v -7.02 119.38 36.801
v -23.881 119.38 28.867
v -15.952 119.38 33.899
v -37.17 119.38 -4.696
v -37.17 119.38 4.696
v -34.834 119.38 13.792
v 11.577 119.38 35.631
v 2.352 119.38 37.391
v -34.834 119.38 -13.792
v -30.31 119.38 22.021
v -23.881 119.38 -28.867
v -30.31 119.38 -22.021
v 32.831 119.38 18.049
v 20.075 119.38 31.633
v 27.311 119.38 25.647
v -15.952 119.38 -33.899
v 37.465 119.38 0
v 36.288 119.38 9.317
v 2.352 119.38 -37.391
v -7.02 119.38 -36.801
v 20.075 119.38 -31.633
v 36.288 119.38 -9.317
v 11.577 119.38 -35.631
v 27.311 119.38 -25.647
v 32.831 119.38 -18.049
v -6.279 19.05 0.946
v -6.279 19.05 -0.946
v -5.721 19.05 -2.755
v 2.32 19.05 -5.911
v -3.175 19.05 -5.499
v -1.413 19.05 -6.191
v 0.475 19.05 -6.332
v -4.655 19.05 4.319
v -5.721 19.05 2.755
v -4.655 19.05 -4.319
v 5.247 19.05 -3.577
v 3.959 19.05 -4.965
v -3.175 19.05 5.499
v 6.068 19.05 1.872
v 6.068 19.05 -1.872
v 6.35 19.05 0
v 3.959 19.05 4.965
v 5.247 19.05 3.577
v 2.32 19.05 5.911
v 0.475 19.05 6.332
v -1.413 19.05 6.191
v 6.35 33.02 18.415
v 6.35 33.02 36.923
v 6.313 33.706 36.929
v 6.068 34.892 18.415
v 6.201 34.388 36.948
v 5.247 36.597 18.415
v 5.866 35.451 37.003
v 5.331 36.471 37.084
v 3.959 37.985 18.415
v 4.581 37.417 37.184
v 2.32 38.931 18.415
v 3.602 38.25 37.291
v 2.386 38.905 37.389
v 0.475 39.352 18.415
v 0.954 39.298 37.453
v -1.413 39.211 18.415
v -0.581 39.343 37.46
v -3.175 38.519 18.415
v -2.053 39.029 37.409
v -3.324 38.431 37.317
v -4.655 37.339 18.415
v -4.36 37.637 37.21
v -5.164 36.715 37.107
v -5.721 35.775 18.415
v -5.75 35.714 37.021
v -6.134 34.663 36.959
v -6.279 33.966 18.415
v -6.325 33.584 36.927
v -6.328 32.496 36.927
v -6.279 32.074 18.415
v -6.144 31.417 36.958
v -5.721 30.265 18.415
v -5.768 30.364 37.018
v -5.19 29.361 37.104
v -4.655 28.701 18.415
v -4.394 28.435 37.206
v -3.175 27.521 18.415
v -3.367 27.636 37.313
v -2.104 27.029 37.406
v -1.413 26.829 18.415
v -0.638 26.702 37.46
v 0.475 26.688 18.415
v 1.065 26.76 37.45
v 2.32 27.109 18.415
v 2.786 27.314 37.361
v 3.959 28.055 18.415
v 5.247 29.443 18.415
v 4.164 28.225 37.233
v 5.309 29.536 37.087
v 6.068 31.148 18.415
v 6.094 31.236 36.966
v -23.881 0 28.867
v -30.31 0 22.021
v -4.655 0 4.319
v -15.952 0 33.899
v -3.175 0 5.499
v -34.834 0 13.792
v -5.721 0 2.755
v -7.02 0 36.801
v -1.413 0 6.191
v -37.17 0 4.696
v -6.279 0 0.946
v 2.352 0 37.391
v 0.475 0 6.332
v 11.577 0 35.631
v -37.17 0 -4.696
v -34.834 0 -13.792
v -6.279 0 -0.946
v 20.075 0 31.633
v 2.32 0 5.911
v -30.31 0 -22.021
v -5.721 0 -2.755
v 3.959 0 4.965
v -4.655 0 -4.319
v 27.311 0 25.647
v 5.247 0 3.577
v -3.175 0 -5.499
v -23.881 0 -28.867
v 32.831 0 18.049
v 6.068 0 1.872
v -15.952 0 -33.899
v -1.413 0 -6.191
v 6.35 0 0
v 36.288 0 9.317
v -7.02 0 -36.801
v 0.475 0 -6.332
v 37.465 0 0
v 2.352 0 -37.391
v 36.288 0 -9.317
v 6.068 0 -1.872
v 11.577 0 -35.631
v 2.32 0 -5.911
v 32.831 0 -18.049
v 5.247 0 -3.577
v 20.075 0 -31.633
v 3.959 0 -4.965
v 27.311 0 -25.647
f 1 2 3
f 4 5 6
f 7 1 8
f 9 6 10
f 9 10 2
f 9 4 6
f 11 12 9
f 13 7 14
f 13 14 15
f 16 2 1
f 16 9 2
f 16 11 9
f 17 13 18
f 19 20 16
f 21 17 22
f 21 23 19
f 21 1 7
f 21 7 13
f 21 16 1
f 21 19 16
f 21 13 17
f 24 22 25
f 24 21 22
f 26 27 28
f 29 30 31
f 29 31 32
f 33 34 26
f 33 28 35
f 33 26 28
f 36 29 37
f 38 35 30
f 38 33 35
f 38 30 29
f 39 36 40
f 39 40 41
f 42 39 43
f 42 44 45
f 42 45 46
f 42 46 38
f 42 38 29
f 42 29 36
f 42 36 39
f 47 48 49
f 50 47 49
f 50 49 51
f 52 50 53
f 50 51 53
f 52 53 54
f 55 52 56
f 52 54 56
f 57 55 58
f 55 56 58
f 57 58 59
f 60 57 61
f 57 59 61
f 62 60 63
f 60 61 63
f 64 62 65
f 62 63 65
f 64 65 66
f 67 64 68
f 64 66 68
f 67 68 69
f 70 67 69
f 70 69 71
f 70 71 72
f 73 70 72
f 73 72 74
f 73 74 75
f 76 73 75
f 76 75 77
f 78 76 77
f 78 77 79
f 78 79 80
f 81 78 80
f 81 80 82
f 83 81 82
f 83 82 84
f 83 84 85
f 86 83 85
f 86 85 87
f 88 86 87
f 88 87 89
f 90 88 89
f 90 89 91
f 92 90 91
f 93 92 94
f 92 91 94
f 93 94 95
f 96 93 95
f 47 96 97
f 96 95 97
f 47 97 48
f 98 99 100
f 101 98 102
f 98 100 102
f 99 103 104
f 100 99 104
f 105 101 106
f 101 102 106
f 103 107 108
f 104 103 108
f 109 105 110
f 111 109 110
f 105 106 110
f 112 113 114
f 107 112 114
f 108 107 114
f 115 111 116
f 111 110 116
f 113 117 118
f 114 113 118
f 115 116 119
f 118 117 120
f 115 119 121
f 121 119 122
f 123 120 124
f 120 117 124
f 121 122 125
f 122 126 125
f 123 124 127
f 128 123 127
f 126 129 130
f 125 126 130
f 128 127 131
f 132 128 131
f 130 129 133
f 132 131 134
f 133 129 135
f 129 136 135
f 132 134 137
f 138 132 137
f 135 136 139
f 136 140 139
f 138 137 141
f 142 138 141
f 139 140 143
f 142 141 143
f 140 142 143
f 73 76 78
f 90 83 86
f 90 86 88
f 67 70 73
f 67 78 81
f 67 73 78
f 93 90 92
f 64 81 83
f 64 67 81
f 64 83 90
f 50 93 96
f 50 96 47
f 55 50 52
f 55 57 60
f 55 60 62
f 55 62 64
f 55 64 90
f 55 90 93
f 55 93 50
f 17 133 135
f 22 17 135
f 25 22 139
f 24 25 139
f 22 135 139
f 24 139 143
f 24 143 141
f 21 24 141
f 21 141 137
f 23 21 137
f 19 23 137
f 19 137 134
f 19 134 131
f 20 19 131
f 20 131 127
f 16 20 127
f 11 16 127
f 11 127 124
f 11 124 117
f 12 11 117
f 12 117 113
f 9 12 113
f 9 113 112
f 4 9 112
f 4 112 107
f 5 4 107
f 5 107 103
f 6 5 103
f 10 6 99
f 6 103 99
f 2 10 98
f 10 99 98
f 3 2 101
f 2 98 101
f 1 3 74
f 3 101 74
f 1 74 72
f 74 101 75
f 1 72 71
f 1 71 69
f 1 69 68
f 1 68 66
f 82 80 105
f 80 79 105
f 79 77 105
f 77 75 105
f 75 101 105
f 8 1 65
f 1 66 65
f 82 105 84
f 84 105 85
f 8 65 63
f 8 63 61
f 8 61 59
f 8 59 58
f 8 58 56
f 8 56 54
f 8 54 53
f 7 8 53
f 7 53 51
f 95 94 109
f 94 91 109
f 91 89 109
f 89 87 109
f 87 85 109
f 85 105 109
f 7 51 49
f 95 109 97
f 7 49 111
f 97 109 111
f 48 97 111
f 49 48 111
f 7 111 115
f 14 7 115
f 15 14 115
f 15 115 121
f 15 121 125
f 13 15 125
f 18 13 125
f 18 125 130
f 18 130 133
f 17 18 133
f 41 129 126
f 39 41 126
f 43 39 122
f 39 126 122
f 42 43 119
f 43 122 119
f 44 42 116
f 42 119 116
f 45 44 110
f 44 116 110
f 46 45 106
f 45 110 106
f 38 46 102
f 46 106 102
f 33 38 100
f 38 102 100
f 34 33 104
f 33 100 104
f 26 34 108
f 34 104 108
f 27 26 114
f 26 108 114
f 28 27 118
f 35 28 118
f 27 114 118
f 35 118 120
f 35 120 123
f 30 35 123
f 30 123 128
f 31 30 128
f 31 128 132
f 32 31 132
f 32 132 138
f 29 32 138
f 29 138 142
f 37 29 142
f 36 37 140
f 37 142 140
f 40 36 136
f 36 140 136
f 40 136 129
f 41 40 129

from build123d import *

# Parameters (mm, degrees)
SKETCH1_R           = 37.465
BOSS_EXTRUDE1_DEPTH = 119.38
SKETCH3_R           = 6.35
CUT_EXTRUDE1_DEPTH  = 19.05
SKETCH4_R           = 6.35
CUT_EXTRUDE2_DEPTH  = 19.05


with BuildPart() as part:
    # Sketch1 → Boss-Extrude1 (new body)
    with BuildSketch(Plane(origin=(0, 0, 0), x_dir=(1, 0, 0), z_dir=(0, 1, 0))):
        Circle(SKETCH1_R)
    extrude(amount=BOSS_EXTRUDE1_DEPTH)

    # Sketch3 → Cut-Extrude1 (cut)
    with BuildSketch(Plane.XY.offset(37.465)):
        with Locations((0, 33.02)):
            Circle(SKETCH3_R)
    extrude(amount=-CUT_EXTRUDE1_DEPTH, mode=Mode.SUBTRACT)

    # Sketch4 → Cut-Extrude2 (cut)
    with BuildSketch(Plane.XZ):
        Circle(SKETCH4_R)
    extrude(amount=-CUT_EXTRUDE2_DEPTH, mode=Mode.SUBTRACT)


solid = part.part
